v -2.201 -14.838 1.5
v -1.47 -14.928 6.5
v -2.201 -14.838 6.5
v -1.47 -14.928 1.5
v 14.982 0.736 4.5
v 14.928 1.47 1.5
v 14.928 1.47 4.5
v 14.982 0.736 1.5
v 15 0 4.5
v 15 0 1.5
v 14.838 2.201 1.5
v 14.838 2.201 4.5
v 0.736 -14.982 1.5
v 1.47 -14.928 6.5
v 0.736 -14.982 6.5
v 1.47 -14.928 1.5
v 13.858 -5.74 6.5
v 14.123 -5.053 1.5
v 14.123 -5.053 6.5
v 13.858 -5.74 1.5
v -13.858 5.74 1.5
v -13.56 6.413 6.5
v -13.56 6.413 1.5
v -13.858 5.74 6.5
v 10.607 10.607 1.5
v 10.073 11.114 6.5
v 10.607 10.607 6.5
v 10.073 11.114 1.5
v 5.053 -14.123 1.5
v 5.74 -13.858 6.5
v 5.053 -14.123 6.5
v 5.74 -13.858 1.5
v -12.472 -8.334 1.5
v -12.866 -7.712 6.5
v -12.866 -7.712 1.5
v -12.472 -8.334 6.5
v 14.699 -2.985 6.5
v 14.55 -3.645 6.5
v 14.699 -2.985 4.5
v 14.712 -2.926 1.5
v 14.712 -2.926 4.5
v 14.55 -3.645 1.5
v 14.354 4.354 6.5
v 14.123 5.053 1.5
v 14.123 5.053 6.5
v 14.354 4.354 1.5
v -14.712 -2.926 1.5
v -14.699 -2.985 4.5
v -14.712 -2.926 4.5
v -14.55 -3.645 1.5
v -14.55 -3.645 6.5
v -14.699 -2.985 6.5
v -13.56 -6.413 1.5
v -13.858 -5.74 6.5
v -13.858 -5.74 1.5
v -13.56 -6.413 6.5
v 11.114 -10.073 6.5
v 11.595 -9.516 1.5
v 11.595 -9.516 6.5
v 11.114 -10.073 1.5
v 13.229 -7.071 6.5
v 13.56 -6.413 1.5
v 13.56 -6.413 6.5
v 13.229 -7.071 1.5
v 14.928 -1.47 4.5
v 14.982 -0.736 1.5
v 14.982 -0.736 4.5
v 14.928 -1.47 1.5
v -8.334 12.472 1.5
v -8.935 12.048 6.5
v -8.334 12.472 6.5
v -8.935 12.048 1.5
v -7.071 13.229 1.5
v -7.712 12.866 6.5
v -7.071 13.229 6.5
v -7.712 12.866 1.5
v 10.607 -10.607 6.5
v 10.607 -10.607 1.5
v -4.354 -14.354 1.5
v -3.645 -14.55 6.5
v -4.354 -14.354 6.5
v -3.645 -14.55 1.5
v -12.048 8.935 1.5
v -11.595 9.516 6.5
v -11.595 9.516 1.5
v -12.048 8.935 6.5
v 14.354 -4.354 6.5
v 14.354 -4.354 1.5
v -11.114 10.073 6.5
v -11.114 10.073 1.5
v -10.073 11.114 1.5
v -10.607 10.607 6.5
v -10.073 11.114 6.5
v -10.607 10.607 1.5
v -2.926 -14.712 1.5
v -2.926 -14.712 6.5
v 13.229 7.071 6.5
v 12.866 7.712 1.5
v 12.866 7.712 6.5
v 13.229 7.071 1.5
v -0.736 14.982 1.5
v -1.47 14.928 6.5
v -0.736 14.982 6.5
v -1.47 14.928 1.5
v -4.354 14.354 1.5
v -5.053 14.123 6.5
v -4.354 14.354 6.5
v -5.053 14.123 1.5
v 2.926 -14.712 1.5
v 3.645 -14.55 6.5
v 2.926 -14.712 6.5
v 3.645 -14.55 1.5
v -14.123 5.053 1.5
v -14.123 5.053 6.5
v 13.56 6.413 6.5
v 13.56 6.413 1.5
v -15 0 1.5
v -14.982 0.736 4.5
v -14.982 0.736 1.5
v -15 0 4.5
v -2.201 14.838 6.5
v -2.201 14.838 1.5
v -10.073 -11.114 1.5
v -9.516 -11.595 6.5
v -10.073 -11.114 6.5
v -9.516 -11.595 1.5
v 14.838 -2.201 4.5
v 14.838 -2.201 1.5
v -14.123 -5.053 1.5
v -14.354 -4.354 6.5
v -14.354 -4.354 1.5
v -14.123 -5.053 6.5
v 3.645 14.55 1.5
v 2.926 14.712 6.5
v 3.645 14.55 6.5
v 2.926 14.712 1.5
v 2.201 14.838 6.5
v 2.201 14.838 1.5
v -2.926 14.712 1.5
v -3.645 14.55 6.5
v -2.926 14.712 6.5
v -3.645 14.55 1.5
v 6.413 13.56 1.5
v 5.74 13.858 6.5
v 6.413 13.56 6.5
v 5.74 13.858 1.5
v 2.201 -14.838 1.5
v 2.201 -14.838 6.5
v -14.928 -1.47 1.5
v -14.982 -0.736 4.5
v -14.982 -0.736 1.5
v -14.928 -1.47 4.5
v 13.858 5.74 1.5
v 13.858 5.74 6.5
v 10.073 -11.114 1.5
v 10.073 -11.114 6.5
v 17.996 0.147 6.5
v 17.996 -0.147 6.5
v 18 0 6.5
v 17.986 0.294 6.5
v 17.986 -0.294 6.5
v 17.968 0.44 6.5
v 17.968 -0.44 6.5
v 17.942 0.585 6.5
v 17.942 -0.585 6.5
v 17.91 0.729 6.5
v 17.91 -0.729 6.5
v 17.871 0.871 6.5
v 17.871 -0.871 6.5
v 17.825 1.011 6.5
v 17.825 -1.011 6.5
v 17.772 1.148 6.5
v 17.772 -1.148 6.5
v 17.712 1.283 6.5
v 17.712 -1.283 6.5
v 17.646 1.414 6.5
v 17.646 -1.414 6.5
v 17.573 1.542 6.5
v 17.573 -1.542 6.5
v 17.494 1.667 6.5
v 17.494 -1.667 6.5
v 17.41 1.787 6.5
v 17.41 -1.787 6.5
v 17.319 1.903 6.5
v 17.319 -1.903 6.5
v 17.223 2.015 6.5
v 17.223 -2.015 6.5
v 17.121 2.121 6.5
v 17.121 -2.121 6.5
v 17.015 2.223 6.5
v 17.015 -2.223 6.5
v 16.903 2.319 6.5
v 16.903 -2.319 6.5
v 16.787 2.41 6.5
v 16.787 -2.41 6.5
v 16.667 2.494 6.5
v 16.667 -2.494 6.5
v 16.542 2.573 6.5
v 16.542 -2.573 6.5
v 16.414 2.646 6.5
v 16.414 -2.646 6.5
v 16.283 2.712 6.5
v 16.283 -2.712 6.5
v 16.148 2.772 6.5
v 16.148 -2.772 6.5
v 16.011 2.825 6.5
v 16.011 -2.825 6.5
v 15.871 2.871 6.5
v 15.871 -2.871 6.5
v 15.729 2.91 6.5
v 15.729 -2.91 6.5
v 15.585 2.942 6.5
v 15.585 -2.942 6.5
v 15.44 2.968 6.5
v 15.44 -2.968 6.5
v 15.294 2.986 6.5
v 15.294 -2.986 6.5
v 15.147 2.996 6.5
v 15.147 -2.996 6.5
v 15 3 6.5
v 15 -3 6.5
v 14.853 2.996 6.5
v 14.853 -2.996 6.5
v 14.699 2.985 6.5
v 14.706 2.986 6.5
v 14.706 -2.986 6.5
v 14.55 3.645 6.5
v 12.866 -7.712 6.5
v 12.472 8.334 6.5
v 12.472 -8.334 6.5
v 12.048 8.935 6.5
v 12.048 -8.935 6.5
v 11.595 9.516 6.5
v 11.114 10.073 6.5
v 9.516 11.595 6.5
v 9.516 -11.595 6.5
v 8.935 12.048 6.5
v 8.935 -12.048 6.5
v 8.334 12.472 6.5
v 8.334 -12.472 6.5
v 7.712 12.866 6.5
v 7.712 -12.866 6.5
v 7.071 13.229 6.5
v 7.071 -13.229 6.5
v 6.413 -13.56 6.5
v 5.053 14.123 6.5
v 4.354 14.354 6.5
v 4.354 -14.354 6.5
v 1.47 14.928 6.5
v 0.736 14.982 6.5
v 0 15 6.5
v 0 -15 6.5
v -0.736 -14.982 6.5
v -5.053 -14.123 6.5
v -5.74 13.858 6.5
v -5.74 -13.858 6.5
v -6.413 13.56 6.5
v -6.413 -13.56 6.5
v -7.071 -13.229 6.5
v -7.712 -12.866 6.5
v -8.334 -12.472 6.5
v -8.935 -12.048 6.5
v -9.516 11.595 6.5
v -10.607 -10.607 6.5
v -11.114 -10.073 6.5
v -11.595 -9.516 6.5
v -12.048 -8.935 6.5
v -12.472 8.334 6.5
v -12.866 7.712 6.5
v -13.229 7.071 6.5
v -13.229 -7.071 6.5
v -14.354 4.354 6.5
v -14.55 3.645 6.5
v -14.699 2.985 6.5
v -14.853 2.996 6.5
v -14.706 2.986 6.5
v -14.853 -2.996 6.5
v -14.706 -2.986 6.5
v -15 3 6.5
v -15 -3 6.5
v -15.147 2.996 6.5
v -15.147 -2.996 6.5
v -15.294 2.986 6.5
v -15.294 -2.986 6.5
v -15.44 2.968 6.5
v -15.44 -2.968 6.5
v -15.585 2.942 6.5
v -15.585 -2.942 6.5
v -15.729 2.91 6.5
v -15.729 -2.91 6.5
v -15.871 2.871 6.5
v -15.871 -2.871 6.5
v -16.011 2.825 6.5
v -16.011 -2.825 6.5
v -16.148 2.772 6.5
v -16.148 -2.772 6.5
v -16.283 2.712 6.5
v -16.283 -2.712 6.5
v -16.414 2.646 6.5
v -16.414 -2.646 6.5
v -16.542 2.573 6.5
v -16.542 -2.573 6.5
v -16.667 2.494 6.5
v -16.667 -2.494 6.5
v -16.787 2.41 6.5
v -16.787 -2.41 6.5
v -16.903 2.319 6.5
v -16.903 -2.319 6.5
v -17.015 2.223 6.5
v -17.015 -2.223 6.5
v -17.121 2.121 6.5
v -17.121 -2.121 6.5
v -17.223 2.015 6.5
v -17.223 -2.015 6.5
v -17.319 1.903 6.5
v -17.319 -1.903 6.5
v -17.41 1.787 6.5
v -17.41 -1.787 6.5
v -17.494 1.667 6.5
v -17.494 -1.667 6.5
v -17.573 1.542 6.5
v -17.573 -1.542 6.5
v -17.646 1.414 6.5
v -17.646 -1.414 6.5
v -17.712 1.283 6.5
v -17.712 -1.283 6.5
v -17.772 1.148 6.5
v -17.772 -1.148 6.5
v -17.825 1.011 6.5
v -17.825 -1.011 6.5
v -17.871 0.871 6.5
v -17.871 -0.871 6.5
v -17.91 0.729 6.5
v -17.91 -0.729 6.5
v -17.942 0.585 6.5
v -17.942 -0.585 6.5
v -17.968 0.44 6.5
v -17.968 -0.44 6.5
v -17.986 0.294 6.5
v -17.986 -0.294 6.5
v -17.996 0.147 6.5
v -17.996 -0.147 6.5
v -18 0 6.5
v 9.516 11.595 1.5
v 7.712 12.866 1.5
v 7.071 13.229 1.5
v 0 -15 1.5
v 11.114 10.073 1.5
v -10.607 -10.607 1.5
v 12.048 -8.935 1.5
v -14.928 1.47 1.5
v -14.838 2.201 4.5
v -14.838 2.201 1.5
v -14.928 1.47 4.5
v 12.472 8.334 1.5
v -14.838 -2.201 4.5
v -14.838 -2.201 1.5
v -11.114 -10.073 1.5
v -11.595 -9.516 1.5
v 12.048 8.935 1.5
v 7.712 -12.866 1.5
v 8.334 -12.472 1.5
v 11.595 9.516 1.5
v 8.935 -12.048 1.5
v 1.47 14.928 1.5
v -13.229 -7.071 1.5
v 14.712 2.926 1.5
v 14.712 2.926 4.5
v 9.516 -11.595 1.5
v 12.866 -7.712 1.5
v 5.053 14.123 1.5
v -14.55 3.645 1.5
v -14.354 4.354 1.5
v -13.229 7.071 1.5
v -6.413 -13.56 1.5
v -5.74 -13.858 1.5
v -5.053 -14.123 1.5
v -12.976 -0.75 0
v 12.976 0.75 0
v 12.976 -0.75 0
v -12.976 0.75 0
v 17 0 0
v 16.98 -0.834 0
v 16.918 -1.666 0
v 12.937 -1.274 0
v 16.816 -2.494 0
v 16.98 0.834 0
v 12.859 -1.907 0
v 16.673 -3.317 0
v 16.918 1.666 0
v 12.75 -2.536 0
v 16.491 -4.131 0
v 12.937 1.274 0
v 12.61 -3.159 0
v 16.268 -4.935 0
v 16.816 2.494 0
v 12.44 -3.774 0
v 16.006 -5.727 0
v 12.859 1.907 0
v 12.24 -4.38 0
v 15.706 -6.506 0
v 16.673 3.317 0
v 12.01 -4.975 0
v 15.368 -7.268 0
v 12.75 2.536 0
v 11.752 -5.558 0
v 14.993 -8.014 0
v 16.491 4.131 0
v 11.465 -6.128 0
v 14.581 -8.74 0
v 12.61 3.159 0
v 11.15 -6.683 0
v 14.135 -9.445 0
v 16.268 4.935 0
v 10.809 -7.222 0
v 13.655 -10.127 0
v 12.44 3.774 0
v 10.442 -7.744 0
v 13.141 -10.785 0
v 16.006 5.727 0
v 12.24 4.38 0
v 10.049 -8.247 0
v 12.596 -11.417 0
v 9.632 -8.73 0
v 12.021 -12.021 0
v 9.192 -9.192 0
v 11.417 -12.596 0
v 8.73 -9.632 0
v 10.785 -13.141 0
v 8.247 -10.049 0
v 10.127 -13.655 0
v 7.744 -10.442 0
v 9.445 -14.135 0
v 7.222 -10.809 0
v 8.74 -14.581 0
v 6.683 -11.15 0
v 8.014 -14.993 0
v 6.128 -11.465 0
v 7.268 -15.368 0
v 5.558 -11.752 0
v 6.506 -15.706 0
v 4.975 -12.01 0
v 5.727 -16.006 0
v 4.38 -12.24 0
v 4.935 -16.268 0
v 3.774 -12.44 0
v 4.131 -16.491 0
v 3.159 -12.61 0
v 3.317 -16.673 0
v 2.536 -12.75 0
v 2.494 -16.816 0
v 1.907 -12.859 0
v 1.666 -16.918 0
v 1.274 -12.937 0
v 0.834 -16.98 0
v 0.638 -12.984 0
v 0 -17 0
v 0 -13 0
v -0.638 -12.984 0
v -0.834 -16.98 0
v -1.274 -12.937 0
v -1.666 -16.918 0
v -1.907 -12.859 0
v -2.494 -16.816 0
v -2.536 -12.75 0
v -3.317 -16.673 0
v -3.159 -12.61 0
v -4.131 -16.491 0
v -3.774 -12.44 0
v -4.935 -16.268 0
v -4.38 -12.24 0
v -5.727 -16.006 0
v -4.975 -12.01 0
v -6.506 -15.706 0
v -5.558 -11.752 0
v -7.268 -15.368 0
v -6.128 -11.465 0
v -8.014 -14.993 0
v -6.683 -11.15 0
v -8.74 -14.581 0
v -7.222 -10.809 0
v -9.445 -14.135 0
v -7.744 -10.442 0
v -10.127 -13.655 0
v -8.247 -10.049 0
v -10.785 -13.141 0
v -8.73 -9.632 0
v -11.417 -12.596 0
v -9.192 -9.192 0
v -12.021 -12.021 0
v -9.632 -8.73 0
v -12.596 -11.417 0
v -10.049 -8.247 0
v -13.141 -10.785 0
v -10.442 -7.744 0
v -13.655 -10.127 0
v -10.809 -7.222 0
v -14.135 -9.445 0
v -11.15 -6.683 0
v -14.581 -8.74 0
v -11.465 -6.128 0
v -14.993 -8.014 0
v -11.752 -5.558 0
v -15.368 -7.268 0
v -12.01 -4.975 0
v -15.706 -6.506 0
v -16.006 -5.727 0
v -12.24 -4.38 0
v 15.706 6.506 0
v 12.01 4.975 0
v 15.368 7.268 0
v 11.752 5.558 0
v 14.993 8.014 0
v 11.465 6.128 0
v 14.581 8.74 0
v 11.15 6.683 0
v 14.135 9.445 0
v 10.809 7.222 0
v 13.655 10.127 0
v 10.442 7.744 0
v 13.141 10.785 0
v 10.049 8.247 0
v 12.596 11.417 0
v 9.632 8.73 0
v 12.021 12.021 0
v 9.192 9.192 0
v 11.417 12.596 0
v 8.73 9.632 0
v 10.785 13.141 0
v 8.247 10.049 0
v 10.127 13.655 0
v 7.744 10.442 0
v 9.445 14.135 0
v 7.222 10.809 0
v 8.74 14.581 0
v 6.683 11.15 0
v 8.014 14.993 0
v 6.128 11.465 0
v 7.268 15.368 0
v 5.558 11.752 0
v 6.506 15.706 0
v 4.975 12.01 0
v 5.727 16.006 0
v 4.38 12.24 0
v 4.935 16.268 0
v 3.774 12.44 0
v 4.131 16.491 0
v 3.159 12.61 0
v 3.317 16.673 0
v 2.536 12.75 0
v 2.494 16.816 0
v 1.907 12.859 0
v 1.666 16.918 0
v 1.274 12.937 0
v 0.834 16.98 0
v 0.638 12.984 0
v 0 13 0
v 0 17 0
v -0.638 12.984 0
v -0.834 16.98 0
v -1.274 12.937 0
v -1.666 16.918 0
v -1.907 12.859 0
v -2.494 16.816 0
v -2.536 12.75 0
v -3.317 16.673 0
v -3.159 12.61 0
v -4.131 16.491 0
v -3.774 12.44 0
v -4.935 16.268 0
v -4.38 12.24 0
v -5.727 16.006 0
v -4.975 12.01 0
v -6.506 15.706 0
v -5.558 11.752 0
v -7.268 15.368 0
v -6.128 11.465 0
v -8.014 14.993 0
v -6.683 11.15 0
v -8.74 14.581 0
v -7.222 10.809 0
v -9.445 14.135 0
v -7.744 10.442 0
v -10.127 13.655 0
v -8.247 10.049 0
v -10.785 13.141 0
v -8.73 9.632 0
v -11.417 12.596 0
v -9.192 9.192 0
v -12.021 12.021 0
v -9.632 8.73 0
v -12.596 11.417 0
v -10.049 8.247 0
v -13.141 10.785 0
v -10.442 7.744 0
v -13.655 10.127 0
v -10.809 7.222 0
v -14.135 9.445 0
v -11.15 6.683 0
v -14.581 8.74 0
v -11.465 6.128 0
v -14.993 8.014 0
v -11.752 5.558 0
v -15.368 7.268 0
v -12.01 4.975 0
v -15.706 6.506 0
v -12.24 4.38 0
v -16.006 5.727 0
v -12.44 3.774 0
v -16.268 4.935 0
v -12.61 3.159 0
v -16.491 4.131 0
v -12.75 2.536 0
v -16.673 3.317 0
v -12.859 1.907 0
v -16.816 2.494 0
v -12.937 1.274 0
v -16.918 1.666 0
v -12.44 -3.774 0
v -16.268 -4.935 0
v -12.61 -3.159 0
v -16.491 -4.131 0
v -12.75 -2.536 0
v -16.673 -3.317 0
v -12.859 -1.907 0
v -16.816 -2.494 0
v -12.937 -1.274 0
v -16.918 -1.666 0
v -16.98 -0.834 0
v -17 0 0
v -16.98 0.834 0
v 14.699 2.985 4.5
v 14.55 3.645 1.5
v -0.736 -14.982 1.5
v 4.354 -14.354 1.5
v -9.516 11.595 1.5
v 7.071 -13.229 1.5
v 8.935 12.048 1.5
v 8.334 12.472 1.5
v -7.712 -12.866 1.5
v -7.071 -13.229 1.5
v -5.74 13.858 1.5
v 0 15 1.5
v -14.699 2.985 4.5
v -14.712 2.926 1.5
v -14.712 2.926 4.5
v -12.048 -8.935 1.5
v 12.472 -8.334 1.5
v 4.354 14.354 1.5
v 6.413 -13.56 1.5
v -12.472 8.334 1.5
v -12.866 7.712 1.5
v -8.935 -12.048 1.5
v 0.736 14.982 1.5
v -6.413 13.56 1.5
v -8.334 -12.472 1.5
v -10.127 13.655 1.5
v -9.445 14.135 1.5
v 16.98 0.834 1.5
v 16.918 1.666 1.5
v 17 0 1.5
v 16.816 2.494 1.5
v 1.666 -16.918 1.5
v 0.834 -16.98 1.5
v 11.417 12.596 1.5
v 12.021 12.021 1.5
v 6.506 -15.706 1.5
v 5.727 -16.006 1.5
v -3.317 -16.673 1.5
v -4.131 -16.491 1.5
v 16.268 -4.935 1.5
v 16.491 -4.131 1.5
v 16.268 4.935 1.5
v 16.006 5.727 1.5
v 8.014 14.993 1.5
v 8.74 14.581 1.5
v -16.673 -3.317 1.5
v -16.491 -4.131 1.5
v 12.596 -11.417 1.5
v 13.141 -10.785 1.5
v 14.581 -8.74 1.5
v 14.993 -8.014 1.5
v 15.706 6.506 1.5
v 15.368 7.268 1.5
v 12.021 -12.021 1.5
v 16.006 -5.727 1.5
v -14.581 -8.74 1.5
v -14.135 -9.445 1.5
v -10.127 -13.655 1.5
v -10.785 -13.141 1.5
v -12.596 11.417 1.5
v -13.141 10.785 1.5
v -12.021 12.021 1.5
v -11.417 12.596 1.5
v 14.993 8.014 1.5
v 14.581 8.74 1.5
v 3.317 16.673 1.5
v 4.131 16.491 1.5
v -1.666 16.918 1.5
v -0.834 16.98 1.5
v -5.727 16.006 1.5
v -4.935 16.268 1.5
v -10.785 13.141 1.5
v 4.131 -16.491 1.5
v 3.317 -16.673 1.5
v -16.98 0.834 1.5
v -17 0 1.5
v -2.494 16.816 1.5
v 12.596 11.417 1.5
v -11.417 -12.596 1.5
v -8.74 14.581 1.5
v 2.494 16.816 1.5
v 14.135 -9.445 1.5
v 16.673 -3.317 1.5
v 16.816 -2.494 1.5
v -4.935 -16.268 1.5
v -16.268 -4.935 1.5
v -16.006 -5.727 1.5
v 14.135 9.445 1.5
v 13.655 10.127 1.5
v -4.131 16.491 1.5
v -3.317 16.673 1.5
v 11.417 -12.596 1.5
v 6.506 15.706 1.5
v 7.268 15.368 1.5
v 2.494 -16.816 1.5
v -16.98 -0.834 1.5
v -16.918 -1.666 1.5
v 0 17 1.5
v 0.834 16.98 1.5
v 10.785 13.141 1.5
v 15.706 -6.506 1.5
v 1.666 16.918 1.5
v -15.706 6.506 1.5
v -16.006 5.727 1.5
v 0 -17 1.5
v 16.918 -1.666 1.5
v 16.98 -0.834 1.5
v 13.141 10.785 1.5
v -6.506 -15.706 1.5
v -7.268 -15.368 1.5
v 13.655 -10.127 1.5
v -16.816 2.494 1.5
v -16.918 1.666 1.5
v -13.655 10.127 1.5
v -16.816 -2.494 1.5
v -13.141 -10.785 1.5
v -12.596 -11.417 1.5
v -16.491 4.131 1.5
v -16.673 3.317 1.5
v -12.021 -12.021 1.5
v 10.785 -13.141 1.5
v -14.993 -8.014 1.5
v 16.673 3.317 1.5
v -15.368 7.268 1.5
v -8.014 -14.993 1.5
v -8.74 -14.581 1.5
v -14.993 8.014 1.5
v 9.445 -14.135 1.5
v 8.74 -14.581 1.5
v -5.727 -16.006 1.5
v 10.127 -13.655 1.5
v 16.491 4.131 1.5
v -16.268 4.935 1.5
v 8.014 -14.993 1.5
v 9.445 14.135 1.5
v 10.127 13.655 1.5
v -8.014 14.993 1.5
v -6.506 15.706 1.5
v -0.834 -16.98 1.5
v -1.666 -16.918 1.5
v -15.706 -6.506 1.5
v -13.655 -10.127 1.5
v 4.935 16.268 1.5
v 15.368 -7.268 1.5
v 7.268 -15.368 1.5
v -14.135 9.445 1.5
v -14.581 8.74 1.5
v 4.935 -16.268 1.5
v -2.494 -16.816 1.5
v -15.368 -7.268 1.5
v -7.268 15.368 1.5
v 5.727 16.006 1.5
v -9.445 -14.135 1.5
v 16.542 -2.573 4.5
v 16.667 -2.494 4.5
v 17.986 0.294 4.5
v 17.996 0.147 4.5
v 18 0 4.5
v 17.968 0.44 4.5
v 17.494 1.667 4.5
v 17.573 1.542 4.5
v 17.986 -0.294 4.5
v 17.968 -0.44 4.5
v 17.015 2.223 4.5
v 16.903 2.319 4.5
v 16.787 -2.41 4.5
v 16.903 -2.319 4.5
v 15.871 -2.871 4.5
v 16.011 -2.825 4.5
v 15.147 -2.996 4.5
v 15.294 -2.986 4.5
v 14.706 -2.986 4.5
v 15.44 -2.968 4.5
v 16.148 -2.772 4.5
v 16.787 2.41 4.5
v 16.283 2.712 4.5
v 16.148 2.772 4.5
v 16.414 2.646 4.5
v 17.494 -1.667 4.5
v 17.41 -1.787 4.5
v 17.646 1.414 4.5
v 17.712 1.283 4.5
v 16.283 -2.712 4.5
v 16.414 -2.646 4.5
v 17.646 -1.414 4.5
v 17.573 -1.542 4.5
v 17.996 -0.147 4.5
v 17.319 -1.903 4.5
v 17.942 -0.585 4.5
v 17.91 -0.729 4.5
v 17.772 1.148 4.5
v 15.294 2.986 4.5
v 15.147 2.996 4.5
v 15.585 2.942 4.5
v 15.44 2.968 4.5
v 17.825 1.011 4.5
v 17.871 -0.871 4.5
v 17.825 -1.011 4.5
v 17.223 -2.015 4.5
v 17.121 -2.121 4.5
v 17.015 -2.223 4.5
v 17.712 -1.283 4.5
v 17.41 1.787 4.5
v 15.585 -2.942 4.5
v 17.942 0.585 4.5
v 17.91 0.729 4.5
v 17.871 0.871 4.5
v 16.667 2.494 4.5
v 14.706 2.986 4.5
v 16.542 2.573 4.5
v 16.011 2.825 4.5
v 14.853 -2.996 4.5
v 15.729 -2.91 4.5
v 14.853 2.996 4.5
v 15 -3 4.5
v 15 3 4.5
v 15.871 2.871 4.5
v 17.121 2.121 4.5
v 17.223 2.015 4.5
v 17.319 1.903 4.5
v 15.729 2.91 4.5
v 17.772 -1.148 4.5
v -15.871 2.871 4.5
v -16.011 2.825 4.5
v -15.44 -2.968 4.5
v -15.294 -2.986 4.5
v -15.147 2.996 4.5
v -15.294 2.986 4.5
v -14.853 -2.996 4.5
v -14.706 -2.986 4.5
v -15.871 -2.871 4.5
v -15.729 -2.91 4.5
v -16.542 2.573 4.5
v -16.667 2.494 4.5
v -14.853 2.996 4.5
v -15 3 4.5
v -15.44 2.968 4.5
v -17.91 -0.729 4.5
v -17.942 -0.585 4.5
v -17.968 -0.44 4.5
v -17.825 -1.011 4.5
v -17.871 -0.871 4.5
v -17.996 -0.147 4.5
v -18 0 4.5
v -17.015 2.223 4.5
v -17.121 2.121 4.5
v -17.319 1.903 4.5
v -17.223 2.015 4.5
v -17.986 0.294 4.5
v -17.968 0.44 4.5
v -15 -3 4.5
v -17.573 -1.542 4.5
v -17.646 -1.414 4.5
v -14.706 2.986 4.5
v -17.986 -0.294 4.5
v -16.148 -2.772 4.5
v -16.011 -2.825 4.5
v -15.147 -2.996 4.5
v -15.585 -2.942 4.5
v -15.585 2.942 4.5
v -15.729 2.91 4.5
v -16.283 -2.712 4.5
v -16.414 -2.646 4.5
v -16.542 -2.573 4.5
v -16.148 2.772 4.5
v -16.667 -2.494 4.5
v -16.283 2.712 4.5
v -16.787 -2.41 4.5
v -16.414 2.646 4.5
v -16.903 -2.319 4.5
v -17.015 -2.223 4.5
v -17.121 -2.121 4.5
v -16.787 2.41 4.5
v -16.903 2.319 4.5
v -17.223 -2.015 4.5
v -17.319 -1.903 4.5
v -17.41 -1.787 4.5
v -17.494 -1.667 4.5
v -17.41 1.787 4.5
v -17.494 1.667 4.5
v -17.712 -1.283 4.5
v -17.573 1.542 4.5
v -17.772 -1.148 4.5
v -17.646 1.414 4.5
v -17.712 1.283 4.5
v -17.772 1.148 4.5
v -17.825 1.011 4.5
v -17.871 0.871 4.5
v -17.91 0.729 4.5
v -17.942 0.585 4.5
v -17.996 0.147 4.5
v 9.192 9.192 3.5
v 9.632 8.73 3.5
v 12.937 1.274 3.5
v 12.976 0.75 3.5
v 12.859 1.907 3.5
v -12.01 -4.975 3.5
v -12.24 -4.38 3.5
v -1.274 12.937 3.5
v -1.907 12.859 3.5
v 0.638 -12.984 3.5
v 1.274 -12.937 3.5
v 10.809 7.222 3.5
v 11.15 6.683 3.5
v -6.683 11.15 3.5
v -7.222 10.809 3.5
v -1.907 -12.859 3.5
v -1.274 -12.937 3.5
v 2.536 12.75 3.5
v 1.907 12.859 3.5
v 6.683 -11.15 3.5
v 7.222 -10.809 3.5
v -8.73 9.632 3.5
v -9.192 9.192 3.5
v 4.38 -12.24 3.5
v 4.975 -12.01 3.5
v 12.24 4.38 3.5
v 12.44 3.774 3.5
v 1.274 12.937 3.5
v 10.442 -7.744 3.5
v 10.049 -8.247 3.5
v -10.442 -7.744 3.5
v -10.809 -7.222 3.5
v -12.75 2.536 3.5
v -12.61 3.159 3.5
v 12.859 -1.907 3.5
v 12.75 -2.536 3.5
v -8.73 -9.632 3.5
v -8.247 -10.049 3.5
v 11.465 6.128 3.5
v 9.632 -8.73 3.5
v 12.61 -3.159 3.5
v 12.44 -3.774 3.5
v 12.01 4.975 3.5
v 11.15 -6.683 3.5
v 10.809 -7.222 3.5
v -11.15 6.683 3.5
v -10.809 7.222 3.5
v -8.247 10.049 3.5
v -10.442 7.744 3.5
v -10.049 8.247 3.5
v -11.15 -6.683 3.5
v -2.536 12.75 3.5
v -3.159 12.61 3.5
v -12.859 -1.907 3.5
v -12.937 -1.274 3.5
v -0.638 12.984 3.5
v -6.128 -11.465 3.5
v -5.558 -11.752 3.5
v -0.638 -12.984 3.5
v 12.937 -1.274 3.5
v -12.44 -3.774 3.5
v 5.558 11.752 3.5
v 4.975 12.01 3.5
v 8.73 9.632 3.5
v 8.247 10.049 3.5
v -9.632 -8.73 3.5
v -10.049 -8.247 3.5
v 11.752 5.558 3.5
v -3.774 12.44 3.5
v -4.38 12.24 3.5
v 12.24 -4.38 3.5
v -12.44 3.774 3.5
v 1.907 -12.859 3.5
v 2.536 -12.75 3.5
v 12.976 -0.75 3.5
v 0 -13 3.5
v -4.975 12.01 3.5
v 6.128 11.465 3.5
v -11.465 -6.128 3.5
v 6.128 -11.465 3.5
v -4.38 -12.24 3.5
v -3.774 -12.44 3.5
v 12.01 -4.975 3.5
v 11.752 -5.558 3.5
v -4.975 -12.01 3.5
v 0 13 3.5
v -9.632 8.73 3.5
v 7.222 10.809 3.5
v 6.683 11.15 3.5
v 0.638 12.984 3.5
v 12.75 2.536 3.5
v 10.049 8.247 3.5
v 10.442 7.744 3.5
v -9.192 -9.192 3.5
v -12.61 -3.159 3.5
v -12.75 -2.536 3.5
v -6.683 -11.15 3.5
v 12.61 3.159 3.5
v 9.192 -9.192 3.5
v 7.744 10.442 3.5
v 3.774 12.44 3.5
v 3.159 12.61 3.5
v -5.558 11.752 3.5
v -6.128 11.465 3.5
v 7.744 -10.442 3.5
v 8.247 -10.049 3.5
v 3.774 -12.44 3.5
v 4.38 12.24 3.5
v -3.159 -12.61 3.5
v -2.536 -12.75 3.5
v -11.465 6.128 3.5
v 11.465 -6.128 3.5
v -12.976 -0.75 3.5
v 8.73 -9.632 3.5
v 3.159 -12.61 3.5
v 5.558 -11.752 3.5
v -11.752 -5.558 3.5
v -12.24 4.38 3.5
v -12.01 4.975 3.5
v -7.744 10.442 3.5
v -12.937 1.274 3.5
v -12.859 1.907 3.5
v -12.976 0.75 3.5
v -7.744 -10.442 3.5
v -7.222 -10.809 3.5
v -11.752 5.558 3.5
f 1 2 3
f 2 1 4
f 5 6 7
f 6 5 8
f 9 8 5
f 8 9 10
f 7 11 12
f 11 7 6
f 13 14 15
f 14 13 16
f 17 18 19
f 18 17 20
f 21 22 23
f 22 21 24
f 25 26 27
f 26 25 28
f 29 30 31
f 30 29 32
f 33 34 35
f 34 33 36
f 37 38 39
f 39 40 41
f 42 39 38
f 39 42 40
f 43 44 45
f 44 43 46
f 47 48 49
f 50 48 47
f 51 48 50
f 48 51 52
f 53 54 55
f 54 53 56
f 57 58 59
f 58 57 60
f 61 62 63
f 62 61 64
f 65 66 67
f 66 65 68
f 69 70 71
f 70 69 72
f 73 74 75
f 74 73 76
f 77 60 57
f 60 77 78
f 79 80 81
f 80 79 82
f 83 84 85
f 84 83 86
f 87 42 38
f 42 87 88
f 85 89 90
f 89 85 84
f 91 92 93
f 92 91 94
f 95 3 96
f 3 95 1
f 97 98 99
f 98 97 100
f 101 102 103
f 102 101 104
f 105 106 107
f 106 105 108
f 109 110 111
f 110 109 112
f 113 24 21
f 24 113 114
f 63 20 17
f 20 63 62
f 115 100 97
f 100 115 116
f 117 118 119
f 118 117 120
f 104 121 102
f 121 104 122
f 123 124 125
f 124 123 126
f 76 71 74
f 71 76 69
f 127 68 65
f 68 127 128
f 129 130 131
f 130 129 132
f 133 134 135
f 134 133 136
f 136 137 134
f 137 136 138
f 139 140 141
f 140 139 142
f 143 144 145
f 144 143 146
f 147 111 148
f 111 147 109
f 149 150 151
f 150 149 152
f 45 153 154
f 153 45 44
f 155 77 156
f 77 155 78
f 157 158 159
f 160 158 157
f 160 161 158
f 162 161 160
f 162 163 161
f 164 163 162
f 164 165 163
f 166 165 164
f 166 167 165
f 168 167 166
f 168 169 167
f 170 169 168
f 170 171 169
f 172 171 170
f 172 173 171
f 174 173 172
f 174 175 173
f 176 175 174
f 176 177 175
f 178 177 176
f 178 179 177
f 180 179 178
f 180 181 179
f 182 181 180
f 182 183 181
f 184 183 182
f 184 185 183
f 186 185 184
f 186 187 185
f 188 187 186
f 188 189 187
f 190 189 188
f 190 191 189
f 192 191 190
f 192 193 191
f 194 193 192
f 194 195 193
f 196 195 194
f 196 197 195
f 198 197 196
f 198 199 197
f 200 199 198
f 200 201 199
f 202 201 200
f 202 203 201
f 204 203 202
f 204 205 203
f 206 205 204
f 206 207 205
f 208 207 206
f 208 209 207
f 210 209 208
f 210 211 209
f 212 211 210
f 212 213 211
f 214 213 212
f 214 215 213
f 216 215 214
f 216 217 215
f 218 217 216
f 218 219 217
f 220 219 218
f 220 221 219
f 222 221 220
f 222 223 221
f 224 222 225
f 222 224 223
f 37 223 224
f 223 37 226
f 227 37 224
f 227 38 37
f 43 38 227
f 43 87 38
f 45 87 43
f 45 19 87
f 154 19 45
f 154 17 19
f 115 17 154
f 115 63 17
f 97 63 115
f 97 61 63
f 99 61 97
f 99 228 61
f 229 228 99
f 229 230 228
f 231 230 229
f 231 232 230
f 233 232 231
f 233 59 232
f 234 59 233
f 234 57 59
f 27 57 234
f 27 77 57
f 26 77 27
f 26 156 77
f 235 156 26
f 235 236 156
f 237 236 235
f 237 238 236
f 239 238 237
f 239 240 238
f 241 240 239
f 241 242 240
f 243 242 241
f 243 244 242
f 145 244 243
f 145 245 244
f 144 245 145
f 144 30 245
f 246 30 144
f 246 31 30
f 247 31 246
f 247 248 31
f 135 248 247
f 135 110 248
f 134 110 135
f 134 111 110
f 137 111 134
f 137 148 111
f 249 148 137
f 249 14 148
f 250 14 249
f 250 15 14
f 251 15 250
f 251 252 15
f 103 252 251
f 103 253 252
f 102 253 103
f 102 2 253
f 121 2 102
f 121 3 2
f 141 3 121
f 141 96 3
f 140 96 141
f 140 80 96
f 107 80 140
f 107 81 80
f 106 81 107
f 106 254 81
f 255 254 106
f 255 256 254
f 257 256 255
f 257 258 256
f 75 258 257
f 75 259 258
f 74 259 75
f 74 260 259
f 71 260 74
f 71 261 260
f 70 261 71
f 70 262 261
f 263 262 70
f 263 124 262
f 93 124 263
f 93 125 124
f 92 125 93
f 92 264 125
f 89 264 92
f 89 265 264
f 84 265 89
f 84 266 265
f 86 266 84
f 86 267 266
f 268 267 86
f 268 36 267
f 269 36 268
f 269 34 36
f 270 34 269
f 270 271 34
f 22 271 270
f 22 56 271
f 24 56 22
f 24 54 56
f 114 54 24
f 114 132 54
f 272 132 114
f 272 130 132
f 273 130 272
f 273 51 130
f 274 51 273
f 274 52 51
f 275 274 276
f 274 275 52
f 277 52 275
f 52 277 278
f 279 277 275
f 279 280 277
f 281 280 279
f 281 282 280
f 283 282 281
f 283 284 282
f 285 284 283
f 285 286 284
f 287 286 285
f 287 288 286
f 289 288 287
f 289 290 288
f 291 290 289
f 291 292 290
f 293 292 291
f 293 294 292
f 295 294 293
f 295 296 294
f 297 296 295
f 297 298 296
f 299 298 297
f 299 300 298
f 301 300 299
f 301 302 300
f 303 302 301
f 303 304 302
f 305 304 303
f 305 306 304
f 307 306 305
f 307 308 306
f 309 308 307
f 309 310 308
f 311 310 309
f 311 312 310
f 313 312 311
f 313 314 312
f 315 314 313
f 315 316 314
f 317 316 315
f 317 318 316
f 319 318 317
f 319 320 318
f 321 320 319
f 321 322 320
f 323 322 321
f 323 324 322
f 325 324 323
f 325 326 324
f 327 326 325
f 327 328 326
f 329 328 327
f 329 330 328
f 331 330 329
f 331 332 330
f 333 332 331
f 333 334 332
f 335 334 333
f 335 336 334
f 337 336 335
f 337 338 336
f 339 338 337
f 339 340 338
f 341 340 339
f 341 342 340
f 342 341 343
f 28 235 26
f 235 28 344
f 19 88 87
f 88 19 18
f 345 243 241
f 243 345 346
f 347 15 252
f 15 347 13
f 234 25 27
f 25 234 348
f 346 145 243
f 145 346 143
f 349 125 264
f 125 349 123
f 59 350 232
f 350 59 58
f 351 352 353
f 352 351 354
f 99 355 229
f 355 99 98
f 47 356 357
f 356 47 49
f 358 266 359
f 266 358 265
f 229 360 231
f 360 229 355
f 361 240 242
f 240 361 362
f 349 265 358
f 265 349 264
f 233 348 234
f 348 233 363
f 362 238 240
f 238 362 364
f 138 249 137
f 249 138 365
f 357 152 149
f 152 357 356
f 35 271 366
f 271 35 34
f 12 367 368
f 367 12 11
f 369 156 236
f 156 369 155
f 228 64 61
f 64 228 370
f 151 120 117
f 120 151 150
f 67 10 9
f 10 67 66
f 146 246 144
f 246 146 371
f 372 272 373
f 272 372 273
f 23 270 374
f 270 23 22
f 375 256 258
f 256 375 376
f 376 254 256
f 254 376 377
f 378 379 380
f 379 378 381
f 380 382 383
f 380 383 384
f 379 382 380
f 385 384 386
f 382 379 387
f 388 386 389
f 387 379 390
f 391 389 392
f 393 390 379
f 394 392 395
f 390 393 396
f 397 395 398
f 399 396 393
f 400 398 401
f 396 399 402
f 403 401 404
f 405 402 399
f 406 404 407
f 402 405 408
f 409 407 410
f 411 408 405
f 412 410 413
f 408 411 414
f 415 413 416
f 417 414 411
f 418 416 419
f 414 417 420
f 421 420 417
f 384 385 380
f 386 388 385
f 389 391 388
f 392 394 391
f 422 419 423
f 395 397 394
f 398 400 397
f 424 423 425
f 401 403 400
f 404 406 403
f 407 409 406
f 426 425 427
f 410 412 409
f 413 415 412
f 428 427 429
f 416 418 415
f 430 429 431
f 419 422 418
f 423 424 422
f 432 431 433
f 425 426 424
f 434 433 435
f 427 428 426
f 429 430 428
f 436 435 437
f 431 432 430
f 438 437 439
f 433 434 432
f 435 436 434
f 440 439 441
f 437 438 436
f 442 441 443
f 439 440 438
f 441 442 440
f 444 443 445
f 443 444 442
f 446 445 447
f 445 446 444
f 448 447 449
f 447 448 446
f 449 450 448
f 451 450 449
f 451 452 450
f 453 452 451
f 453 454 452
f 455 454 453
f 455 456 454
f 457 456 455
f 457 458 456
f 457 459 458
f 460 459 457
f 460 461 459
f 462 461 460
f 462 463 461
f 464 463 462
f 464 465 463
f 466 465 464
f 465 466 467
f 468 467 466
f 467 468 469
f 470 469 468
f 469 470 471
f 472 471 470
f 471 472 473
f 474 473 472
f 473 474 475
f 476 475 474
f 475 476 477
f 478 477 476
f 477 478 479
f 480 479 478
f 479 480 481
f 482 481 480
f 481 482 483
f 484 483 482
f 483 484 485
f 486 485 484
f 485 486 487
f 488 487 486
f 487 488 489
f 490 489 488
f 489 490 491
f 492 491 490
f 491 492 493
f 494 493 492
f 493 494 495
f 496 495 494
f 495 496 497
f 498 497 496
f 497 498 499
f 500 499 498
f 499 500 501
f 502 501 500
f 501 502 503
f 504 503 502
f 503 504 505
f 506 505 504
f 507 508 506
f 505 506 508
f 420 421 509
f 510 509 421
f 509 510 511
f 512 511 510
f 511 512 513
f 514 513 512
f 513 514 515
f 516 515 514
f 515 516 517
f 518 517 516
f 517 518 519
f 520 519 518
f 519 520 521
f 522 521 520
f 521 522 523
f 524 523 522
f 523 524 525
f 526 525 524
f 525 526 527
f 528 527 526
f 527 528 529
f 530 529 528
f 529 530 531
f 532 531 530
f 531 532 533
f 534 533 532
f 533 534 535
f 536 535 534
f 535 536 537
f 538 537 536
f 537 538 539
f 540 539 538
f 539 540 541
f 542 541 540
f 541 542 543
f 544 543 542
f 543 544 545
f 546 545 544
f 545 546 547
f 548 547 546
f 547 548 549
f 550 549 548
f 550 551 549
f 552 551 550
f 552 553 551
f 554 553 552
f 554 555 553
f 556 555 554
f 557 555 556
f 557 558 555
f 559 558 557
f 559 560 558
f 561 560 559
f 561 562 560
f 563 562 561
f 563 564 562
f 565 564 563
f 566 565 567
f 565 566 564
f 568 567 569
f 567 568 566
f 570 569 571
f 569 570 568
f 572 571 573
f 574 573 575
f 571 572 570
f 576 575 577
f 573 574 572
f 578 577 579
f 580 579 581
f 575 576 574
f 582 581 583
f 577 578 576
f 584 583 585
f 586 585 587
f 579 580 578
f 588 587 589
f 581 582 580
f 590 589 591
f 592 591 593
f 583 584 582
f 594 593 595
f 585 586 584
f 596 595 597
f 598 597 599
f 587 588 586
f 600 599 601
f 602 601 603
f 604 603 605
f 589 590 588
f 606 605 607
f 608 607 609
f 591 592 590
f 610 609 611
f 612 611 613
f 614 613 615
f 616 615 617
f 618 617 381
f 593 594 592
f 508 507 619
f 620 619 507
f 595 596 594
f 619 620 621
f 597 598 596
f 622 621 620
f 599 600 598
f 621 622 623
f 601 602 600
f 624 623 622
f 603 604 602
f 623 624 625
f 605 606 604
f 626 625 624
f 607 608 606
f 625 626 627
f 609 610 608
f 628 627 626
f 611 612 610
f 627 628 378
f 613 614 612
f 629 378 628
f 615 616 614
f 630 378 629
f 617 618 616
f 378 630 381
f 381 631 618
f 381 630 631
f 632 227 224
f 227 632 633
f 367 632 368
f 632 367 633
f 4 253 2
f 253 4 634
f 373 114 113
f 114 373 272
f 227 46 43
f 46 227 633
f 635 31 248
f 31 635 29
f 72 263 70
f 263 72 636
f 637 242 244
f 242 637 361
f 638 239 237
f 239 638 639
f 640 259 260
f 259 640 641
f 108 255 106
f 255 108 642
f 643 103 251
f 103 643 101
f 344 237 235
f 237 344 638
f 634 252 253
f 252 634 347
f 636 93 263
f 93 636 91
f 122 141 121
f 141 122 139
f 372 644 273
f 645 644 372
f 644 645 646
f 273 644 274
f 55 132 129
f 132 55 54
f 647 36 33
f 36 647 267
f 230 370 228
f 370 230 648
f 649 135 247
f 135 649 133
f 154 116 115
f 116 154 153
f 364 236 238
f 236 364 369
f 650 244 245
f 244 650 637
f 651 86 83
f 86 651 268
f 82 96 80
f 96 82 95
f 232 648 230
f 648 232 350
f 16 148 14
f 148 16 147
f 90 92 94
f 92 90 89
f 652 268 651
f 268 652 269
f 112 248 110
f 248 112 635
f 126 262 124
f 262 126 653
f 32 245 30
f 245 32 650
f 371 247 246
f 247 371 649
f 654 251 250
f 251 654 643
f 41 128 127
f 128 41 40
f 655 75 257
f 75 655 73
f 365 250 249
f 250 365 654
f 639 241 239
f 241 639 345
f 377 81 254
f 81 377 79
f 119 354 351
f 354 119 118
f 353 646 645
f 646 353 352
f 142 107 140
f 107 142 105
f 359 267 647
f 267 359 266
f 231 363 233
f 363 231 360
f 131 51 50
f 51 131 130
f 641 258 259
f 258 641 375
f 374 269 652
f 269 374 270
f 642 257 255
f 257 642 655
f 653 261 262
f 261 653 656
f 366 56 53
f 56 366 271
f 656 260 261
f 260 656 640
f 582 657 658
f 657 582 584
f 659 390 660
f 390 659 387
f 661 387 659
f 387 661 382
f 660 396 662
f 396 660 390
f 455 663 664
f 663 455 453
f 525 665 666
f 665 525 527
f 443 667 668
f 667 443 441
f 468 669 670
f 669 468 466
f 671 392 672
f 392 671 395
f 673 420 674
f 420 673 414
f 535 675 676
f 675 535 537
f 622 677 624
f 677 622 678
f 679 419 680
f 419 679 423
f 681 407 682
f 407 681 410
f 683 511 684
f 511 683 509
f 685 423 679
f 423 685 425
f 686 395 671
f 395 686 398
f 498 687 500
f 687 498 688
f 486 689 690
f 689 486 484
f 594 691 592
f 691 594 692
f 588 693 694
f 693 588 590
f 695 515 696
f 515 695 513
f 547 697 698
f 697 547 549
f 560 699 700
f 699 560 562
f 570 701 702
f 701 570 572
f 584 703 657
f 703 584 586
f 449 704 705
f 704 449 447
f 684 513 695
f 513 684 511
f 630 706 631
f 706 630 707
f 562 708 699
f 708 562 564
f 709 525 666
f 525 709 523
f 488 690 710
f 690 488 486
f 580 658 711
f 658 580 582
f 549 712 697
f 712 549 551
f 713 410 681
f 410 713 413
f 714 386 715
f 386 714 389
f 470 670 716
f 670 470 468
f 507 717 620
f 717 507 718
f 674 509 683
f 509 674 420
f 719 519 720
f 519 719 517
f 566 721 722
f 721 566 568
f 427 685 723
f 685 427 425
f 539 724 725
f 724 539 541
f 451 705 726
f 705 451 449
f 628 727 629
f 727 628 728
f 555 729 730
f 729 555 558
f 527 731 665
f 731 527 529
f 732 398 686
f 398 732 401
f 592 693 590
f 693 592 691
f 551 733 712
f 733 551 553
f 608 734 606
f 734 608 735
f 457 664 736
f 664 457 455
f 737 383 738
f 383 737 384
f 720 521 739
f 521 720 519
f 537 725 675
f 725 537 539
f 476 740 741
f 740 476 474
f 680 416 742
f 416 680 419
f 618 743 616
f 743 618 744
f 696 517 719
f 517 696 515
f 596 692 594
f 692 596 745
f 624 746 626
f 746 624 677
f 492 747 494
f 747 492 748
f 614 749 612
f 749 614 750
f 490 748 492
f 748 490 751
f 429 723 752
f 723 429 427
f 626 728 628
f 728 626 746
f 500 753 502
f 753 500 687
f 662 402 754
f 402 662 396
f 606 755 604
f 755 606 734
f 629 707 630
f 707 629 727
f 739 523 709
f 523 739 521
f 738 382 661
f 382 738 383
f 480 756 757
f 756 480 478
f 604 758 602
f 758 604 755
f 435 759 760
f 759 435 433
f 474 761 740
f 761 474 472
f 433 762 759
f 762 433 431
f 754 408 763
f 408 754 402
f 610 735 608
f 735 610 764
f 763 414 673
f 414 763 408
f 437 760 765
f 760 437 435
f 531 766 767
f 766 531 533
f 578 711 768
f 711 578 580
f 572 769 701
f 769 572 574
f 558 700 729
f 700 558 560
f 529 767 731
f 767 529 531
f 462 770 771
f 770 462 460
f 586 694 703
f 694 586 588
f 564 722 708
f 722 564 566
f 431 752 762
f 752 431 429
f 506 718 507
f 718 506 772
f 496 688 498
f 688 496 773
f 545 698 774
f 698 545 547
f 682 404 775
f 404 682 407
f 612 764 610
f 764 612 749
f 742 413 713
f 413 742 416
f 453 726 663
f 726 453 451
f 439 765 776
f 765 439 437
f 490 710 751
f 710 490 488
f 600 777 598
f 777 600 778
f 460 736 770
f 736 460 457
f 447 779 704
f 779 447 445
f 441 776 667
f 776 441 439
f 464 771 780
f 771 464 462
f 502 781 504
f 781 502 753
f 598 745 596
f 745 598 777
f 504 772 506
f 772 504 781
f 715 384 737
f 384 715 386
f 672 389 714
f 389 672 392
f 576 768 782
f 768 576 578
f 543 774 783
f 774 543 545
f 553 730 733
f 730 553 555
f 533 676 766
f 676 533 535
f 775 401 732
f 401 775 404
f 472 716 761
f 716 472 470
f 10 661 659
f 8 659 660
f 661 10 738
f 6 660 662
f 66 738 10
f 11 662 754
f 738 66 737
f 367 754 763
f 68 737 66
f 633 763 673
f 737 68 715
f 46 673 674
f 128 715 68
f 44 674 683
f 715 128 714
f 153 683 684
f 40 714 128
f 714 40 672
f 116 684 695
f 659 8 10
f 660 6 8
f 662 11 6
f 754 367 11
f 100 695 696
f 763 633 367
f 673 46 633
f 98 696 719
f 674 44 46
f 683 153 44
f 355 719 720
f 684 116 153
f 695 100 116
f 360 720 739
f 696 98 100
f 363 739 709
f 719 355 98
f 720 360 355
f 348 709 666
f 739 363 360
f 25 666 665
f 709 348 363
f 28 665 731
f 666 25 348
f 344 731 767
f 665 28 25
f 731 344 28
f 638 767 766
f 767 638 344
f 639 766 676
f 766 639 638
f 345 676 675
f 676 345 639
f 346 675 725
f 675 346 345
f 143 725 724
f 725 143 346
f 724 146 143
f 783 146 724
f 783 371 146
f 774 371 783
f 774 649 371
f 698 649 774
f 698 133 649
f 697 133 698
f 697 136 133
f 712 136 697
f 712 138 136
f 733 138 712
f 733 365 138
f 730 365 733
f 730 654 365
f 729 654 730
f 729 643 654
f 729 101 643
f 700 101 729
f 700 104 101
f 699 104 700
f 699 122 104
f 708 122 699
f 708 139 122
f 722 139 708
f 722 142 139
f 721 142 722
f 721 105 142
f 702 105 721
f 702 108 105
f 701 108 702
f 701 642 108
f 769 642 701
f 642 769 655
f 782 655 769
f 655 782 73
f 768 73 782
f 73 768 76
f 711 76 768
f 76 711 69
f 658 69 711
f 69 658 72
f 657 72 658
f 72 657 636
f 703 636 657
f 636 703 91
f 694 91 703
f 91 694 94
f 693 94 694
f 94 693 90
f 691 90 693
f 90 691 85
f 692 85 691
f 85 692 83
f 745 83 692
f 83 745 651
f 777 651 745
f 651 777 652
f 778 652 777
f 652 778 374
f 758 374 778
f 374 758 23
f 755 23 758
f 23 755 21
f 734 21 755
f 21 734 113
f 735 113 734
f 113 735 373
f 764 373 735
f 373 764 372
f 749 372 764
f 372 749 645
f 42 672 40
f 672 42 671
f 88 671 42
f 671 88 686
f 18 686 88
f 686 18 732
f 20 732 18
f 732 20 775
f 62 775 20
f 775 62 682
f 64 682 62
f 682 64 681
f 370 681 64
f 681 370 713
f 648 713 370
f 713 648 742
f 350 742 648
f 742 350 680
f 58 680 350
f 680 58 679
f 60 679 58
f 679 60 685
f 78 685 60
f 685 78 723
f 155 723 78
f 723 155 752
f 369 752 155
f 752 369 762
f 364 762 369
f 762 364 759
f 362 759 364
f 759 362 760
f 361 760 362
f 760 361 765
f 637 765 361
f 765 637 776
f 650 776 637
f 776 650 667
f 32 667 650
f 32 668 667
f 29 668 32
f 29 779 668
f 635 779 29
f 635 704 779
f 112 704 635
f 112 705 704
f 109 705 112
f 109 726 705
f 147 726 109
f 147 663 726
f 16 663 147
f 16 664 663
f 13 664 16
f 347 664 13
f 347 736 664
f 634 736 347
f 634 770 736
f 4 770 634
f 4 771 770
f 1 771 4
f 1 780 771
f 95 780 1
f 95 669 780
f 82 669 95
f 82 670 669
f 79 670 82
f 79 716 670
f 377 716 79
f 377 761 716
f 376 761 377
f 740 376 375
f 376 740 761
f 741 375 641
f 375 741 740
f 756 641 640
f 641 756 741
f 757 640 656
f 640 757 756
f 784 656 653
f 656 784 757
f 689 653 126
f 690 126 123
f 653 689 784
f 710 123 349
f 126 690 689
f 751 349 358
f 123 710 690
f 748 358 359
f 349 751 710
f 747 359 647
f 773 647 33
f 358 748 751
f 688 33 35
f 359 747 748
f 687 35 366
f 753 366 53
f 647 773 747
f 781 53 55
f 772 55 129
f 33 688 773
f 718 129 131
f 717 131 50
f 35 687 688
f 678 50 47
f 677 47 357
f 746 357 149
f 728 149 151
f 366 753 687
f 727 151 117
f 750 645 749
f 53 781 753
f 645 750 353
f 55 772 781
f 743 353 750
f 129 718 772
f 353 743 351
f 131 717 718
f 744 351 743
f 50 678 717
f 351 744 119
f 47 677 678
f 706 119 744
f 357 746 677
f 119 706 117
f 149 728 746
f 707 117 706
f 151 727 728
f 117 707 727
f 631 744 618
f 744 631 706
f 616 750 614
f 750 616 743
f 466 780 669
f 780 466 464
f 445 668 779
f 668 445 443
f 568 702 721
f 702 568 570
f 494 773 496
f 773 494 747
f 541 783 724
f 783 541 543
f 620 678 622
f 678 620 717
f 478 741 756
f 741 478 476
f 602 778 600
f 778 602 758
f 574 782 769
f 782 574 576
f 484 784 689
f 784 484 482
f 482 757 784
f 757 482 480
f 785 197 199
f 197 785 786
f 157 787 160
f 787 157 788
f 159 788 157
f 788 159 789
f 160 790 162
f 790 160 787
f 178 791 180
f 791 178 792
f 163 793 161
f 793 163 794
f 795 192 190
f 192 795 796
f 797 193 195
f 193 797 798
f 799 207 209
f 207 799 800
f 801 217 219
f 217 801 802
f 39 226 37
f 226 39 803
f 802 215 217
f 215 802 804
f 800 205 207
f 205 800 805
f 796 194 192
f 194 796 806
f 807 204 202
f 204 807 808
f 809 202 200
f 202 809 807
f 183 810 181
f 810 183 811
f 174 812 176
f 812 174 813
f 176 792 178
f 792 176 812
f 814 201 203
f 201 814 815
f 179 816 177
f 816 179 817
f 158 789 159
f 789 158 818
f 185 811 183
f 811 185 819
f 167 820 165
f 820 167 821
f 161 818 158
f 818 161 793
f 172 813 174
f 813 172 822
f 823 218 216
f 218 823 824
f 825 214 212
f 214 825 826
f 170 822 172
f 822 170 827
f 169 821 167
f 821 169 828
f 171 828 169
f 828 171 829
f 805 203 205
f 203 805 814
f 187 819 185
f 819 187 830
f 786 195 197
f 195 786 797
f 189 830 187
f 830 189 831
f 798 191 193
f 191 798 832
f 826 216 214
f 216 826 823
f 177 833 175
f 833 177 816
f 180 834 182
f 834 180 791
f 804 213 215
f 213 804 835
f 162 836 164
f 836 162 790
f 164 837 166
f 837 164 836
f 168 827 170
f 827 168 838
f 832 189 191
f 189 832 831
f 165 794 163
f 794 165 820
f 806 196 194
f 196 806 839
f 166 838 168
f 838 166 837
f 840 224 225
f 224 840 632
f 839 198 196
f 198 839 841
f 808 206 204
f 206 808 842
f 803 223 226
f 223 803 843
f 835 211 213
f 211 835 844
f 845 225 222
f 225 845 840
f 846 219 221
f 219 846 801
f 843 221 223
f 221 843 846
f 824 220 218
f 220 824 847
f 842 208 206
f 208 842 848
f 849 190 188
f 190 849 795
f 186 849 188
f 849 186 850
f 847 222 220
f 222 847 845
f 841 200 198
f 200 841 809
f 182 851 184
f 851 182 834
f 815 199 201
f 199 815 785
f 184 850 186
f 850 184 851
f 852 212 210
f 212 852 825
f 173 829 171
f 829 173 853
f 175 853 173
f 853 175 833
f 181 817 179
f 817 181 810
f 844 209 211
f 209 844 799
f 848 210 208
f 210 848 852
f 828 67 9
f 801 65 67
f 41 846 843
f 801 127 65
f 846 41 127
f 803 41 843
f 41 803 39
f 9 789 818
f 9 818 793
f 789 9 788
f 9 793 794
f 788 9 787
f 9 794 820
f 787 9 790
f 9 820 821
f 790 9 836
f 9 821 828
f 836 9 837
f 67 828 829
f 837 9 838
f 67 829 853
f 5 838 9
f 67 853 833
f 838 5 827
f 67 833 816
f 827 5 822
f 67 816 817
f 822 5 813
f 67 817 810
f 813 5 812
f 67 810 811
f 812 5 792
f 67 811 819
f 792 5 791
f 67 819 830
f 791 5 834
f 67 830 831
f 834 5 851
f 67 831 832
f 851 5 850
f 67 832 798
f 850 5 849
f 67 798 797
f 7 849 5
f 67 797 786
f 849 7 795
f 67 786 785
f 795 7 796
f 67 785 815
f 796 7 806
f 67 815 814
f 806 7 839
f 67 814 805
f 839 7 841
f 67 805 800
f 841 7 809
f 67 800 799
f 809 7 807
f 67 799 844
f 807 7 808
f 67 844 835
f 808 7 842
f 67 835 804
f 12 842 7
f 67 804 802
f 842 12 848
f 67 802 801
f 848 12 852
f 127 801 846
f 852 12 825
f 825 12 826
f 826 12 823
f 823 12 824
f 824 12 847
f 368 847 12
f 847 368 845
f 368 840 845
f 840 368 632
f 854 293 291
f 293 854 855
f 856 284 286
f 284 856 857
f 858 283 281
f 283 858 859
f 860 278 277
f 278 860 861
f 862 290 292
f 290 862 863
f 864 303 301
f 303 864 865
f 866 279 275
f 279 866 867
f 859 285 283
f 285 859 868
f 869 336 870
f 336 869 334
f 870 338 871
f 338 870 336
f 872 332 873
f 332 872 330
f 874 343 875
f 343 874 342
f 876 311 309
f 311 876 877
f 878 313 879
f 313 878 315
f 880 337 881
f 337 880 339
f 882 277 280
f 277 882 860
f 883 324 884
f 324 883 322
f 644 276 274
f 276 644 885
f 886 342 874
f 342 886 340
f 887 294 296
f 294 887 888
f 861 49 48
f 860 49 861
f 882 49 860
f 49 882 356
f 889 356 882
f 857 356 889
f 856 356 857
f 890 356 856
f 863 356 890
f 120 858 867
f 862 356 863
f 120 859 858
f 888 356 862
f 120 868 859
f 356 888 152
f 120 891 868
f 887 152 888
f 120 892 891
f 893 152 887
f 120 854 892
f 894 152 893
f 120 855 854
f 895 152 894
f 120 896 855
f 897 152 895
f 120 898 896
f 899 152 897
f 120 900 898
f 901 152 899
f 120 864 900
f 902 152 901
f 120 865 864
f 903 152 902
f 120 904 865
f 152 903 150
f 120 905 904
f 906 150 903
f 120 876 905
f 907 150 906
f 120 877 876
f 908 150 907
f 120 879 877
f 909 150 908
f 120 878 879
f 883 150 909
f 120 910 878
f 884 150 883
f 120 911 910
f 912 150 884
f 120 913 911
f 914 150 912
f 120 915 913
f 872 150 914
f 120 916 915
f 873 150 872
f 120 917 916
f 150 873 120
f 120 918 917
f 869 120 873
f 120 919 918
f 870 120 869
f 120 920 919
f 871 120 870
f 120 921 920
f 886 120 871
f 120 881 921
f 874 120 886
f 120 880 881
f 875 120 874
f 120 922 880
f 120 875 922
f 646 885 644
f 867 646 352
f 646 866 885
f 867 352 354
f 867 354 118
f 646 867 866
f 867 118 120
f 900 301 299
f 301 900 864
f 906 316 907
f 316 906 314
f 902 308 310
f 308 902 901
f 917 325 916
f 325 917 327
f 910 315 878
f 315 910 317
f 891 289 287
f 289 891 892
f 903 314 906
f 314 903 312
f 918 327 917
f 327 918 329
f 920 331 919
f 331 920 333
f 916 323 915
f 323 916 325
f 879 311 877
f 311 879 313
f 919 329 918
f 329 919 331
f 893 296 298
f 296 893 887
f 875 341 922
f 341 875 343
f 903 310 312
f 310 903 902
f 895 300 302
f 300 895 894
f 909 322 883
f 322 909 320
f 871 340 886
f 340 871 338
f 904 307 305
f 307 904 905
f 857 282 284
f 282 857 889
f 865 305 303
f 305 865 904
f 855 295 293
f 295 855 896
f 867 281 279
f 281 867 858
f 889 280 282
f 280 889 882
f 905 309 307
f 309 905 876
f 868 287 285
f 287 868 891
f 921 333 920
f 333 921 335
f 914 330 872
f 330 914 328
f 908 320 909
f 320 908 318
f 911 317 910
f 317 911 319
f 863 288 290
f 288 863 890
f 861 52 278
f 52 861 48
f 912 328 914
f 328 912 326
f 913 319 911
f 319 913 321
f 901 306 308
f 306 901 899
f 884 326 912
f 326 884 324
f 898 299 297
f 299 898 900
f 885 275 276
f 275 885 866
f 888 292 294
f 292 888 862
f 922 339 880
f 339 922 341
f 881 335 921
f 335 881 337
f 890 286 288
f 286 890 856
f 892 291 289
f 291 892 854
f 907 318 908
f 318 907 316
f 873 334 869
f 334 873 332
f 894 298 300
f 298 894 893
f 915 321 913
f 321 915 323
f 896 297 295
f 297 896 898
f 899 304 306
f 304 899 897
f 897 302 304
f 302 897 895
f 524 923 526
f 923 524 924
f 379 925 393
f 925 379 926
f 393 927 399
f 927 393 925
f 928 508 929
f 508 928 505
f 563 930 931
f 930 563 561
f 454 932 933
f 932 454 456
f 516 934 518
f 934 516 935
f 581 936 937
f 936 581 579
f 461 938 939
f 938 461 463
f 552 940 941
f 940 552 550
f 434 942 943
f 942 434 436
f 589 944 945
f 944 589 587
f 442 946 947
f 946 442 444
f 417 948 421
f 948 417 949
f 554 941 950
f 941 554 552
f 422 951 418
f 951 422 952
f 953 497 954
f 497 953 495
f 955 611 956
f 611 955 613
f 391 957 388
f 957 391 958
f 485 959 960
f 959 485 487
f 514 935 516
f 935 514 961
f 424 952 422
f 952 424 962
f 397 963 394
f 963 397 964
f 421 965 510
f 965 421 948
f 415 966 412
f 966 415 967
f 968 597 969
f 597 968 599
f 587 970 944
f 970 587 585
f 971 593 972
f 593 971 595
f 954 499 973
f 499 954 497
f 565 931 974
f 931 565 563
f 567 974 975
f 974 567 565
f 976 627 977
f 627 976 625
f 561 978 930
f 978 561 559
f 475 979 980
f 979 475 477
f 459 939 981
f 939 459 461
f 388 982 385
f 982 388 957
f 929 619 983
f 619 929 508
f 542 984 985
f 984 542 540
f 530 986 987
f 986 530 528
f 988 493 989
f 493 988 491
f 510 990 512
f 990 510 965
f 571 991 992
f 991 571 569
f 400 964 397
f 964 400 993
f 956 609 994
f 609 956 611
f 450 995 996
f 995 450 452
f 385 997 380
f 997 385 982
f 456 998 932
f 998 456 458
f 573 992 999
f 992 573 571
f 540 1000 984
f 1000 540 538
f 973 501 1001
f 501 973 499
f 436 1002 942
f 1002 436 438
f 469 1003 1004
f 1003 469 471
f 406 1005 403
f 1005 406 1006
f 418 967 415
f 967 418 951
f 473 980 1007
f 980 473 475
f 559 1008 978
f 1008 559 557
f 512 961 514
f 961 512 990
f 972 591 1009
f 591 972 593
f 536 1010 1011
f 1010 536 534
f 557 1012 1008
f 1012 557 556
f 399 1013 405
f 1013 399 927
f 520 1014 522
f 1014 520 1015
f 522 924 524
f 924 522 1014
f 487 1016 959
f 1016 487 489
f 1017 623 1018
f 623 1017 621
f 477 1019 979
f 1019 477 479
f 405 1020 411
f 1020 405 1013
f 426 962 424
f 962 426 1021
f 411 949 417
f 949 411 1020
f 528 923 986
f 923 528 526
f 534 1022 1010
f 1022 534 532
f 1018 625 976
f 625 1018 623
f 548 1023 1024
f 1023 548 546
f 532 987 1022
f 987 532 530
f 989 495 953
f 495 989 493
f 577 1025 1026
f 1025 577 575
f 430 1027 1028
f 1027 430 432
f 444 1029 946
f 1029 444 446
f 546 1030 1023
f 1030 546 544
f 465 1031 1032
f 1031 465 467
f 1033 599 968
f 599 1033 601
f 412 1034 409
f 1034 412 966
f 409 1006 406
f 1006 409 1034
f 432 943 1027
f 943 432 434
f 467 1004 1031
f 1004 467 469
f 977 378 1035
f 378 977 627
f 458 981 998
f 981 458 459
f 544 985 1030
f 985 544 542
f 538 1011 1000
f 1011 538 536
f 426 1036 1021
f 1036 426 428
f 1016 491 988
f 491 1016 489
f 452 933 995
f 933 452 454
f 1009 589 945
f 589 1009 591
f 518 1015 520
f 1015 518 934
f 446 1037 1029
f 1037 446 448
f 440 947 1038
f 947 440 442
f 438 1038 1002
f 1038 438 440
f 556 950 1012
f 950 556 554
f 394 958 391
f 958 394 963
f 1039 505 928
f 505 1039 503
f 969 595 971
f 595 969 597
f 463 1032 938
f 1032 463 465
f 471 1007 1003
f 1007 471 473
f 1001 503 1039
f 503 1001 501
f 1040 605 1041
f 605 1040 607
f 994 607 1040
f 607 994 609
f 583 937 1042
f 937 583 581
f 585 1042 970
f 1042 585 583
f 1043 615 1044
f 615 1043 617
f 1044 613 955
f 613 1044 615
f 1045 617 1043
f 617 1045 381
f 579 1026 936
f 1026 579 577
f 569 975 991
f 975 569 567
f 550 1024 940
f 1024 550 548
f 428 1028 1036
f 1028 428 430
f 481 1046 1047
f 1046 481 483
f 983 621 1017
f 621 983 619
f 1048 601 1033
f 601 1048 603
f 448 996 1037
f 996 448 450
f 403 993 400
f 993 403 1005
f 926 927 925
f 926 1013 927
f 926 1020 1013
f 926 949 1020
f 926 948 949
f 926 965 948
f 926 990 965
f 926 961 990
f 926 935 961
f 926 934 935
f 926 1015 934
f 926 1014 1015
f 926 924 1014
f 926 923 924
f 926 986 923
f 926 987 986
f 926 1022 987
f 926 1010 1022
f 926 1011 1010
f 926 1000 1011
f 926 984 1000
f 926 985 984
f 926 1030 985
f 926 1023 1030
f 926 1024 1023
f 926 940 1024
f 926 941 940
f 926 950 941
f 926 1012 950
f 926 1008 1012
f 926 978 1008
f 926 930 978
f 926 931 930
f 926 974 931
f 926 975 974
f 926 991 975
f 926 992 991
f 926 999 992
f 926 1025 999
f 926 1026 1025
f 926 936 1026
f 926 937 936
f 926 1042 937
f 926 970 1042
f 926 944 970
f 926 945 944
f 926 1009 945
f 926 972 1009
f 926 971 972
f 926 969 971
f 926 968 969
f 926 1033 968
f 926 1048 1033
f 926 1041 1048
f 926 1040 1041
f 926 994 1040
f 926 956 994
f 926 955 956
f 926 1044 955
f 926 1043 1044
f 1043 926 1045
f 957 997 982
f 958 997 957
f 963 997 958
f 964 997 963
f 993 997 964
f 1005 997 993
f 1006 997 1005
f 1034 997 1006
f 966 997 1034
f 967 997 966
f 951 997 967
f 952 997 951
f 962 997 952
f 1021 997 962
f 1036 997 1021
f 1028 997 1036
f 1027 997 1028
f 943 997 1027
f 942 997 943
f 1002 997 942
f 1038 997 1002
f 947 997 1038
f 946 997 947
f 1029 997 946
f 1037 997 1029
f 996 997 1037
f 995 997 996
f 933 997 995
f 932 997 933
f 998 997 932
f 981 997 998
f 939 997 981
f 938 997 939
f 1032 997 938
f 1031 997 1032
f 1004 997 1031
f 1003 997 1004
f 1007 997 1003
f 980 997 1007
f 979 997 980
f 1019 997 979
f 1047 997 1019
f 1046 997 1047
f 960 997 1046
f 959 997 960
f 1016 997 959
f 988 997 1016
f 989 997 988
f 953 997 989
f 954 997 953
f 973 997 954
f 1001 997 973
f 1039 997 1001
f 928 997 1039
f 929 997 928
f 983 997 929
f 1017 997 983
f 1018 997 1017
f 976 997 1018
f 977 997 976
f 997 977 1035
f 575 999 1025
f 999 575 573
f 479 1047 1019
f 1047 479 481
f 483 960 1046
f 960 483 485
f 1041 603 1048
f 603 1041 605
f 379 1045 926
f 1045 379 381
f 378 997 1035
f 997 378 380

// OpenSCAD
$fn = 128;

// Lid for a ceramic piggybank, prevents coins falling out

height = 6.5;
diameter = 30;
notch = 6;


difference() {
    union() {
        cylinder(h=height, d=diameter);

        cylinder(h=1.5, d=diameter+4);

        // notches
        translate([diameter/2, 0, 1.5+3])
        cylinder(h=2, d=notch);
        translate([-diameter/2, 0, 1.5+3])
        cylinder(h=2, d=notch);
    }


    translate([0, 0, -1])
    cylinder(h=height-2, d=diameter-4);
}

translate([0, 0, height/2])
cube([diameter-1, 1.5, height], center=true);
